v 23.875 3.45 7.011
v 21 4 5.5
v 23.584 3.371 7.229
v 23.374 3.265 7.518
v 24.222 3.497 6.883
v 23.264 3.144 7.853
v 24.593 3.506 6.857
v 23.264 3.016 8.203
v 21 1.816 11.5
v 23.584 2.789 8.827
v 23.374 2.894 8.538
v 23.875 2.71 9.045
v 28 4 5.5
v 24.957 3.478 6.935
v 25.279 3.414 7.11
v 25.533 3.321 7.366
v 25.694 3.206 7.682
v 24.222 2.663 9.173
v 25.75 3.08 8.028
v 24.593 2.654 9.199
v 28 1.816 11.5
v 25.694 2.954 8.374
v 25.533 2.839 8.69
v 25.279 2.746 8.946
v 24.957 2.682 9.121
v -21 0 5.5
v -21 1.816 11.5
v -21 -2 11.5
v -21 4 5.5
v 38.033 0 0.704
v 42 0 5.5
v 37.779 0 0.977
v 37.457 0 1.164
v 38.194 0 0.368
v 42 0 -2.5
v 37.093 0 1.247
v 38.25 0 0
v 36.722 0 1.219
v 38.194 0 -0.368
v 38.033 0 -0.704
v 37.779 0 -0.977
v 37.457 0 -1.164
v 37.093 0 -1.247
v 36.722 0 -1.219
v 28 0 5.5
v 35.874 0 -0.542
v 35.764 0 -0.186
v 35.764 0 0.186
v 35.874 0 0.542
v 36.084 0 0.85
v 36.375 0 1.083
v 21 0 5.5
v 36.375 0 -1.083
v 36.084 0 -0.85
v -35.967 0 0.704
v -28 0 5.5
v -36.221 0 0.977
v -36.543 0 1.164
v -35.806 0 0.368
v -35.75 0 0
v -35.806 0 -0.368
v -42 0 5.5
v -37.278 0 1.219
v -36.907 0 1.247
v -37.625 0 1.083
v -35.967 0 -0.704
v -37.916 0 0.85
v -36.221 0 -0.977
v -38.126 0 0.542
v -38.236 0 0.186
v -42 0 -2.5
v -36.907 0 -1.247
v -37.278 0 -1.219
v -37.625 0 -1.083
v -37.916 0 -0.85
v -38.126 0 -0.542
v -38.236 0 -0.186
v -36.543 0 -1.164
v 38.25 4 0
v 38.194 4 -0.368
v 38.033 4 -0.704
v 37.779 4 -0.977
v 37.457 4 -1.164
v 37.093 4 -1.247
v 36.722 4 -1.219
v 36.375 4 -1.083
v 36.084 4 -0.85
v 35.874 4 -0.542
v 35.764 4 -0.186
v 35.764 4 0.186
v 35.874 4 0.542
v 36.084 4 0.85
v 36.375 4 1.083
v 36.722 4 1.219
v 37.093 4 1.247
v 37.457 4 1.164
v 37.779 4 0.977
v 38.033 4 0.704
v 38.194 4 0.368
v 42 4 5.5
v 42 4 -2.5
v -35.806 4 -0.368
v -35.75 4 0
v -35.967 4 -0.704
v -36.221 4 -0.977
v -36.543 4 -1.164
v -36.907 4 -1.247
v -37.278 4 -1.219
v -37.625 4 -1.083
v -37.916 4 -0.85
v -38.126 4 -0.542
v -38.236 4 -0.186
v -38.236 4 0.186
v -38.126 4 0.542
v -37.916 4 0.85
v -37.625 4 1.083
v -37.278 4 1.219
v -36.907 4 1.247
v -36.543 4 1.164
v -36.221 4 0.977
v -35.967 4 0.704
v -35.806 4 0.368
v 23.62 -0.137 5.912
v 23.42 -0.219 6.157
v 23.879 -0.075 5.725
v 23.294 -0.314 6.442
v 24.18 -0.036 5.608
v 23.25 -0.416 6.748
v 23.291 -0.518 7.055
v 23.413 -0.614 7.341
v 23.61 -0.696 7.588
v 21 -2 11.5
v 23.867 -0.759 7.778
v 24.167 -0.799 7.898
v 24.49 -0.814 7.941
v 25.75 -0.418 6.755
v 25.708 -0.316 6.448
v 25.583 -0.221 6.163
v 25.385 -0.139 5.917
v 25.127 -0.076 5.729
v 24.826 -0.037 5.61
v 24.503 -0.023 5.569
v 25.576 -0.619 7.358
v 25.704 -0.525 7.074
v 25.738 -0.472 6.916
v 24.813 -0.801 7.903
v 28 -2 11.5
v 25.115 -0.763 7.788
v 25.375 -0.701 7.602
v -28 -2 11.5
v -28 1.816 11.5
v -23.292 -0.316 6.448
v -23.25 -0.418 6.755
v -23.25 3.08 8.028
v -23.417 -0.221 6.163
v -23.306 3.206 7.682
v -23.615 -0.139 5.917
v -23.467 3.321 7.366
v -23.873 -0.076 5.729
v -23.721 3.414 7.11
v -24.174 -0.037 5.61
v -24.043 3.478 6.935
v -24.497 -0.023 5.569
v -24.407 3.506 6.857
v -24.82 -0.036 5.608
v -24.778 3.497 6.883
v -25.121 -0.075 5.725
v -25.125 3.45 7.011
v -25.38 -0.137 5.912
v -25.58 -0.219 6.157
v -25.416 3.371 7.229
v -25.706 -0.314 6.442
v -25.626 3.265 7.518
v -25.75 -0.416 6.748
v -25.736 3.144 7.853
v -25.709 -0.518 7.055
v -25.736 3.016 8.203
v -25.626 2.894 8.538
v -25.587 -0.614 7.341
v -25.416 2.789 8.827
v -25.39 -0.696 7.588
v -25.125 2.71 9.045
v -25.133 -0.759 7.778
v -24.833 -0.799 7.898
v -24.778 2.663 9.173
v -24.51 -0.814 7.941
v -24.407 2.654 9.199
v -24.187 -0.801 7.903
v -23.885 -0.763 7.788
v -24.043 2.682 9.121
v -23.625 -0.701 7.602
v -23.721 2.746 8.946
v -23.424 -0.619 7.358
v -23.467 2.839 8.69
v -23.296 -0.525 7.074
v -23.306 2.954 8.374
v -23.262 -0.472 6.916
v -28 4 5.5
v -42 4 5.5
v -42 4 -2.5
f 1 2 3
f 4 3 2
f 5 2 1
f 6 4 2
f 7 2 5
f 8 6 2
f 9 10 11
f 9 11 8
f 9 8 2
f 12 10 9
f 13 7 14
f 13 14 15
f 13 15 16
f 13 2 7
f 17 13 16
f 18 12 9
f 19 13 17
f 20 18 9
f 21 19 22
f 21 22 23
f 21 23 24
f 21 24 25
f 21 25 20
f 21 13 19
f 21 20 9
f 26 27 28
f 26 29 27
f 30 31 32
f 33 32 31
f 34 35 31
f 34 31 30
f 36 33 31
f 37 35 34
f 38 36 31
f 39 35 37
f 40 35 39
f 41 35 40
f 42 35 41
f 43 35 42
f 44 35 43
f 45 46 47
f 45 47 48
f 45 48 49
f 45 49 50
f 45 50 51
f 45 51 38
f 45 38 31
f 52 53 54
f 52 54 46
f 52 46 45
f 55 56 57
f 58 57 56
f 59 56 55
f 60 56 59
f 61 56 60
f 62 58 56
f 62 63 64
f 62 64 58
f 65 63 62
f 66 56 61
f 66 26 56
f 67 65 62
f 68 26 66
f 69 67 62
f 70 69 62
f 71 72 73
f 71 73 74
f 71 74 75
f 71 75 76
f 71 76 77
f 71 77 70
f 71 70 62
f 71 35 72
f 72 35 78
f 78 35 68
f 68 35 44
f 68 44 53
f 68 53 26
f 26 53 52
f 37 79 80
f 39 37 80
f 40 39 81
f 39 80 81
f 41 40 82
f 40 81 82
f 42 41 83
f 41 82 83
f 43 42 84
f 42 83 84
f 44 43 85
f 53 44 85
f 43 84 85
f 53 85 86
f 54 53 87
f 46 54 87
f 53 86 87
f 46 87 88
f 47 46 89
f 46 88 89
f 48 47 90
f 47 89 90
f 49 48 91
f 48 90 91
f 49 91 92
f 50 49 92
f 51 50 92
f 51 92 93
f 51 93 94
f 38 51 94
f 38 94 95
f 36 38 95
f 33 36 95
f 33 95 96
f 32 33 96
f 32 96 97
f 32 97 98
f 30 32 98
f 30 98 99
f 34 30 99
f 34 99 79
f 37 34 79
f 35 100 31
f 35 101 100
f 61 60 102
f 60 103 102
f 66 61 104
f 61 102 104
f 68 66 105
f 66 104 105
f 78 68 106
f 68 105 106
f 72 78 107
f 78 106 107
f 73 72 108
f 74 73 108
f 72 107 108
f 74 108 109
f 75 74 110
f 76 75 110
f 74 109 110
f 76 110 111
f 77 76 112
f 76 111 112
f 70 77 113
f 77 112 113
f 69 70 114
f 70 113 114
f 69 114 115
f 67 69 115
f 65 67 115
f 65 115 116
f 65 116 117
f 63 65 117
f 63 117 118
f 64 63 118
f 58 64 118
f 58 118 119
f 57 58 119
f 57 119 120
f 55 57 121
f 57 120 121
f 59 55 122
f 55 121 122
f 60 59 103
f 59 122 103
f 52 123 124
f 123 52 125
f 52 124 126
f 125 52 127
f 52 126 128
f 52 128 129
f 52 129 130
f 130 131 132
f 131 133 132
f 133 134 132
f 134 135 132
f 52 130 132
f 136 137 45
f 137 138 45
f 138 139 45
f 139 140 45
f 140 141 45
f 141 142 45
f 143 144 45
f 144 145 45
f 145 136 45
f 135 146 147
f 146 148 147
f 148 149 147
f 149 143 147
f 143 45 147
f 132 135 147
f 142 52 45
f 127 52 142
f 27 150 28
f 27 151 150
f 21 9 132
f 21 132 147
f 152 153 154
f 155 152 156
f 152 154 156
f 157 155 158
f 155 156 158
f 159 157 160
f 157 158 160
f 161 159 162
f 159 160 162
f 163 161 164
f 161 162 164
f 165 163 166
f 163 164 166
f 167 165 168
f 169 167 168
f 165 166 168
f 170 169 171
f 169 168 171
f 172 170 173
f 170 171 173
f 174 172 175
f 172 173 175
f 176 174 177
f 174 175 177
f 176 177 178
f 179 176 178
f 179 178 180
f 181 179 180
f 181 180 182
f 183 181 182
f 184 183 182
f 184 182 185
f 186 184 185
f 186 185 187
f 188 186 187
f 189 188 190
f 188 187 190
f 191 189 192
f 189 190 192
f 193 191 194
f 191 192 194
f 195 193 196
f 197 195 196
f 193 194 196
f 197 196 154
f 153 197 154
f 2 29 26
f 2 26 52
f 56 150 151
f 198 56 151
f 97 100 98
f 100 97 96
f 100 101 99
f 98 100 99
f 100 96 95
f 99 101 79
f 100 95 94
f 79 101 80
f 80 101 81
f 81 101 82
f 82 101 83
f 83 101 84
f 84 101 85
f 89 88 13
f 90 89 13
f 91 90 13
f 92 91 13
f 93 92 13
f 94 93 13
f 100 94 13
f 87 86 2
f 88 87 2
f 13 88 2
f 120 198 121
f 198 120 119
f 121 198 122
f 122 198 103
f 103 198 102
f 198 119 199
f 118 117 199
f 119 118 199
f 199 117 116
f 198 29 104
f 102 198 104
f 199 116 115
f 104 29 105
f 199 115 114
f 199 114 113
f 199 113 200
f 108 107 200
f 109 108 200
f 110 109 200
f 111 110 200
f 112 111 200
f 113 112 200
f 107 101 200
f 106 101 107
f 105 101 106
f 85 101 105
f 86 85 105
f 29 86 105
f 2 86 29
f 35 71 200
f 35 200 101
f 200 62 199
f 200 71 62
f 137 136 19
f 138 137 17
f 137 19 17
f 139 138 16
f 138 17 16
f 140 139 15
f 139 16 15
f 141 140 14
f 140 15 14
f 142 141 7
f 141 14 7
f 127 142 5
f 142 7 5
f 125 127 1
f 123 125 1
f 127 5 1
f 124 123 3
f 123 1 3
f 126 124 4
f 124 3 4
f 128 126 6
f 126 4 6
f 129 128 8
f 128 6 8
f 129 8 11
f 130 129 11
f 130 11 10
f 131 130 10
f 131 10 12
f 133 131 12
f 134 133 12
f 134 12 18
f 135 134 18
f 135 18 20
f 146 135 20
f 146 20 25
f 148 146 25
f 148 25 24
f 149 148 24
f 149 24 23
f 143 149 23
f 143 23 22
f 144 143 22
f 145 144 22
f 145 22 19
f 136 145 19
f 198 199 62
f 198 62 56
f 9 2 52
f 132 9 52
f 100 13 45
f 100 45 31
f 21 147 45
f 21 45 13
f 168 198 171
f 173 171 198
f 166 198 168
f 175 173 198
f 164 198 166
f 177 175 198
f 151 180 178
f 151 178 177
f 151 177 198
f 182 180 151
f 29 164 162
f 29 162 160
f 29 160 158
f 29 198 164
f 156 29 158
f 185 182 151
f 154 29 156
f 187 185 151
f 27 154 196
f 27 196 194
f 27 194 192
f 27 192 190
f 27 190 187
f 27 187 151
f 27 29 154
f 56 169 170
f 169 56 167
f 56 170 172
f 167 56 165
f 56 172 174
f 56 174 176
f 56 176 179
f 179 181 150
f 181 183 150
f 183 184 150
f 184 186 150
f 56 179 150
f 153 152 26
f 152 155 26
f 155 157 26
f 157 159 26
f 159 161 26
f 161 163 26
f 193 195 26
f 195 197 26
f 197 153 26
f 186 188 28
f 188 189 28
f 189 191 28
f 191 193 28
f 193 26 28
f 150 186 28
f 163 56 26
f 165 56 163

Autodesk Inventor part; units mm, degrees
ref_plane "YZ Plane" through (0, 0, 0) normal (1, 0, 0) x (0, 1, 0)
ref_plane "XZ Plane" through (0, 0, 0) normal (0, 1, 0) x (-1, 0, 0)
ref_plane "XY Plane" through (0, 0, 0) normal (0, 0, 1) x (1, 0, 0)
sketch "Sketch1" plane through (0, 0, 0) normal (0, 1, 0) x (-1, 0, 0)
  line L0 (-42, 2.5) -> (42, 2.5)
  line L1 (42, 2.5) -> (42, -2.5)
  line L2 (42, -2.5) -> (-42, -2.5)
  line L3 (-42, -2.5) -> (-42, 2.5)
  line L4 (-42, 2.5) -> (42, -2.5) construction
  line L5 (42, 2.5) -> (-42, -2.5) construction
  point P0 (0, 0)
  dimension "d0" = 84
  dimension "d1" = 5
extrude "Extrusion1" add sketch "Sketch1" along normal blind 4
sketch "Sketch2" plane through (0, 4, 0) normal (0, 1, 0) x (1, 0, 0)
  circle A0 centre (-37, 0) radius 1.25
  circle A1 centre (37, 0) radius 1.25
  line L0 (42, -2.5) -> (42, 2.5) projected
  line L1 (-42, -2.5) -> (-42, 2.5) projected
  point P0 (0, 0)
  dimension "d4" = 2.5
  dimension "d5" = 2.5
  dimension "d6" = 5
  dimension "d7" = 5
extrude "Extrusion2" cut sketch "Sketch2" against normal up to next
sketch "Sketch3" plane through (-42, 0, 2.5) normal (0, 0, 1) x (1, 0, 0)
  line L0 (84, 4) -> (0, 4) projected
  line L1 (0, 4) -> (84, 4)
  line L2 (84, 4) -> (84, 0)
  line L3 (84, 0) -> (0, 0)
  line L4 (0, 0) -> (0, 4)
  point P0 (42, 0)
extrude "Extrusion3" add sketch "Sketch3" along normal blind 3
sketch "Sketch4" plane through (-42, 0, 5.5) normal (0, 0, 1) x (1, 0, 0)
  line L0 (84, 4) -> (70, 4)
  line L1 (84, 4) -> (0, 4) projected
  line L2 (0, 4) -> (14, 4)
  line L3 (14, 4) -> (21, 4)
  line L4 (21, 4) -> (21, -2)
  line L5 (21, -2) -> (14, -2)
  line L6 (14, -2) -> (14, 4)
  line L7 (70, 4) -> (63, 4)
  line L8 (63, 4) -> (63, -2)
  line L9 (63, -2) -> (70, -2)
  line L10 (70, -2) -> (70, 4)
  point P0 (42, 0)
  dimension "d12" = 14
  dimension "d13" = 14
  dimension "d14" = 7
  dimension "d15" = 6
  dimension "d16" = 7
  dimension "d17" = 6
extrude "Extrusion4" add sketch "Sketch4" along normal blind 6
sketch "Sketch5" plane through (28, -2, 5.5) normal (1, 0, 0) x (0, 0, -1)
  line L0 (0, 6) -> (-6, 3.8162)
  line L1 (-6, 0) -> (-6, 6) projected
  line L2 (0, 6) -> (6.3851, 6) construction
  line L3 (-6, 3.8162) -> (-6, 6)
  line L4 (0, 6) -> (-6, 6) projected
  line L5 (0, 6) -> (-6, 6)
  point P0 (5.5, 2)
  dimension "d20" = 160
extrude "Extrusion5" cut sketch "Sketch5" against normal through all
sketch "Sketch6" plane through (28, -2, 5.5) normal (1, 0, 0) x (0, 0, -1)
  line L0 (0, 0) -> (0, 2) projected
  line L1 (0, 0) -> (-6, 0) projected
  line L2 (0, 2) -> (-6, 0)
  point P0 (5.5, 2)
extrude "Extrusion6" cut sketch "Sketch6" against normal through all
sketch "Sketch7" plane through (21, 1.8162, 11.5) normal (0, 0.9397, 0.342) x (1, 0, 0)
  line L0 (0, -1.3052) -> (7, -1.3052) projected
  line L1 (3.5, -1.3052) -> (3.5, 3.6948)
  circle A0 centre (3.5, 3.6948) radius 1.25
  line L2 (-49, -1.3052) -> (-42, -1.3052) projected
  line L3 (-45.5, -1.3052) -> (-45.5, 3.6948)
  circle A1 centre (-45.5, 3.6948) radius 1.25
  point P0 (-21, 10.1853)
  dimension "d25" = 5
  dimension "d26" = 2.5
  dimension "d27" = 5
  dimension "d28" = 2.5
extrude "Extrusion7" cut sketch "Sketch7" against normal up to next
properties part number "rpi_stabilizer"
